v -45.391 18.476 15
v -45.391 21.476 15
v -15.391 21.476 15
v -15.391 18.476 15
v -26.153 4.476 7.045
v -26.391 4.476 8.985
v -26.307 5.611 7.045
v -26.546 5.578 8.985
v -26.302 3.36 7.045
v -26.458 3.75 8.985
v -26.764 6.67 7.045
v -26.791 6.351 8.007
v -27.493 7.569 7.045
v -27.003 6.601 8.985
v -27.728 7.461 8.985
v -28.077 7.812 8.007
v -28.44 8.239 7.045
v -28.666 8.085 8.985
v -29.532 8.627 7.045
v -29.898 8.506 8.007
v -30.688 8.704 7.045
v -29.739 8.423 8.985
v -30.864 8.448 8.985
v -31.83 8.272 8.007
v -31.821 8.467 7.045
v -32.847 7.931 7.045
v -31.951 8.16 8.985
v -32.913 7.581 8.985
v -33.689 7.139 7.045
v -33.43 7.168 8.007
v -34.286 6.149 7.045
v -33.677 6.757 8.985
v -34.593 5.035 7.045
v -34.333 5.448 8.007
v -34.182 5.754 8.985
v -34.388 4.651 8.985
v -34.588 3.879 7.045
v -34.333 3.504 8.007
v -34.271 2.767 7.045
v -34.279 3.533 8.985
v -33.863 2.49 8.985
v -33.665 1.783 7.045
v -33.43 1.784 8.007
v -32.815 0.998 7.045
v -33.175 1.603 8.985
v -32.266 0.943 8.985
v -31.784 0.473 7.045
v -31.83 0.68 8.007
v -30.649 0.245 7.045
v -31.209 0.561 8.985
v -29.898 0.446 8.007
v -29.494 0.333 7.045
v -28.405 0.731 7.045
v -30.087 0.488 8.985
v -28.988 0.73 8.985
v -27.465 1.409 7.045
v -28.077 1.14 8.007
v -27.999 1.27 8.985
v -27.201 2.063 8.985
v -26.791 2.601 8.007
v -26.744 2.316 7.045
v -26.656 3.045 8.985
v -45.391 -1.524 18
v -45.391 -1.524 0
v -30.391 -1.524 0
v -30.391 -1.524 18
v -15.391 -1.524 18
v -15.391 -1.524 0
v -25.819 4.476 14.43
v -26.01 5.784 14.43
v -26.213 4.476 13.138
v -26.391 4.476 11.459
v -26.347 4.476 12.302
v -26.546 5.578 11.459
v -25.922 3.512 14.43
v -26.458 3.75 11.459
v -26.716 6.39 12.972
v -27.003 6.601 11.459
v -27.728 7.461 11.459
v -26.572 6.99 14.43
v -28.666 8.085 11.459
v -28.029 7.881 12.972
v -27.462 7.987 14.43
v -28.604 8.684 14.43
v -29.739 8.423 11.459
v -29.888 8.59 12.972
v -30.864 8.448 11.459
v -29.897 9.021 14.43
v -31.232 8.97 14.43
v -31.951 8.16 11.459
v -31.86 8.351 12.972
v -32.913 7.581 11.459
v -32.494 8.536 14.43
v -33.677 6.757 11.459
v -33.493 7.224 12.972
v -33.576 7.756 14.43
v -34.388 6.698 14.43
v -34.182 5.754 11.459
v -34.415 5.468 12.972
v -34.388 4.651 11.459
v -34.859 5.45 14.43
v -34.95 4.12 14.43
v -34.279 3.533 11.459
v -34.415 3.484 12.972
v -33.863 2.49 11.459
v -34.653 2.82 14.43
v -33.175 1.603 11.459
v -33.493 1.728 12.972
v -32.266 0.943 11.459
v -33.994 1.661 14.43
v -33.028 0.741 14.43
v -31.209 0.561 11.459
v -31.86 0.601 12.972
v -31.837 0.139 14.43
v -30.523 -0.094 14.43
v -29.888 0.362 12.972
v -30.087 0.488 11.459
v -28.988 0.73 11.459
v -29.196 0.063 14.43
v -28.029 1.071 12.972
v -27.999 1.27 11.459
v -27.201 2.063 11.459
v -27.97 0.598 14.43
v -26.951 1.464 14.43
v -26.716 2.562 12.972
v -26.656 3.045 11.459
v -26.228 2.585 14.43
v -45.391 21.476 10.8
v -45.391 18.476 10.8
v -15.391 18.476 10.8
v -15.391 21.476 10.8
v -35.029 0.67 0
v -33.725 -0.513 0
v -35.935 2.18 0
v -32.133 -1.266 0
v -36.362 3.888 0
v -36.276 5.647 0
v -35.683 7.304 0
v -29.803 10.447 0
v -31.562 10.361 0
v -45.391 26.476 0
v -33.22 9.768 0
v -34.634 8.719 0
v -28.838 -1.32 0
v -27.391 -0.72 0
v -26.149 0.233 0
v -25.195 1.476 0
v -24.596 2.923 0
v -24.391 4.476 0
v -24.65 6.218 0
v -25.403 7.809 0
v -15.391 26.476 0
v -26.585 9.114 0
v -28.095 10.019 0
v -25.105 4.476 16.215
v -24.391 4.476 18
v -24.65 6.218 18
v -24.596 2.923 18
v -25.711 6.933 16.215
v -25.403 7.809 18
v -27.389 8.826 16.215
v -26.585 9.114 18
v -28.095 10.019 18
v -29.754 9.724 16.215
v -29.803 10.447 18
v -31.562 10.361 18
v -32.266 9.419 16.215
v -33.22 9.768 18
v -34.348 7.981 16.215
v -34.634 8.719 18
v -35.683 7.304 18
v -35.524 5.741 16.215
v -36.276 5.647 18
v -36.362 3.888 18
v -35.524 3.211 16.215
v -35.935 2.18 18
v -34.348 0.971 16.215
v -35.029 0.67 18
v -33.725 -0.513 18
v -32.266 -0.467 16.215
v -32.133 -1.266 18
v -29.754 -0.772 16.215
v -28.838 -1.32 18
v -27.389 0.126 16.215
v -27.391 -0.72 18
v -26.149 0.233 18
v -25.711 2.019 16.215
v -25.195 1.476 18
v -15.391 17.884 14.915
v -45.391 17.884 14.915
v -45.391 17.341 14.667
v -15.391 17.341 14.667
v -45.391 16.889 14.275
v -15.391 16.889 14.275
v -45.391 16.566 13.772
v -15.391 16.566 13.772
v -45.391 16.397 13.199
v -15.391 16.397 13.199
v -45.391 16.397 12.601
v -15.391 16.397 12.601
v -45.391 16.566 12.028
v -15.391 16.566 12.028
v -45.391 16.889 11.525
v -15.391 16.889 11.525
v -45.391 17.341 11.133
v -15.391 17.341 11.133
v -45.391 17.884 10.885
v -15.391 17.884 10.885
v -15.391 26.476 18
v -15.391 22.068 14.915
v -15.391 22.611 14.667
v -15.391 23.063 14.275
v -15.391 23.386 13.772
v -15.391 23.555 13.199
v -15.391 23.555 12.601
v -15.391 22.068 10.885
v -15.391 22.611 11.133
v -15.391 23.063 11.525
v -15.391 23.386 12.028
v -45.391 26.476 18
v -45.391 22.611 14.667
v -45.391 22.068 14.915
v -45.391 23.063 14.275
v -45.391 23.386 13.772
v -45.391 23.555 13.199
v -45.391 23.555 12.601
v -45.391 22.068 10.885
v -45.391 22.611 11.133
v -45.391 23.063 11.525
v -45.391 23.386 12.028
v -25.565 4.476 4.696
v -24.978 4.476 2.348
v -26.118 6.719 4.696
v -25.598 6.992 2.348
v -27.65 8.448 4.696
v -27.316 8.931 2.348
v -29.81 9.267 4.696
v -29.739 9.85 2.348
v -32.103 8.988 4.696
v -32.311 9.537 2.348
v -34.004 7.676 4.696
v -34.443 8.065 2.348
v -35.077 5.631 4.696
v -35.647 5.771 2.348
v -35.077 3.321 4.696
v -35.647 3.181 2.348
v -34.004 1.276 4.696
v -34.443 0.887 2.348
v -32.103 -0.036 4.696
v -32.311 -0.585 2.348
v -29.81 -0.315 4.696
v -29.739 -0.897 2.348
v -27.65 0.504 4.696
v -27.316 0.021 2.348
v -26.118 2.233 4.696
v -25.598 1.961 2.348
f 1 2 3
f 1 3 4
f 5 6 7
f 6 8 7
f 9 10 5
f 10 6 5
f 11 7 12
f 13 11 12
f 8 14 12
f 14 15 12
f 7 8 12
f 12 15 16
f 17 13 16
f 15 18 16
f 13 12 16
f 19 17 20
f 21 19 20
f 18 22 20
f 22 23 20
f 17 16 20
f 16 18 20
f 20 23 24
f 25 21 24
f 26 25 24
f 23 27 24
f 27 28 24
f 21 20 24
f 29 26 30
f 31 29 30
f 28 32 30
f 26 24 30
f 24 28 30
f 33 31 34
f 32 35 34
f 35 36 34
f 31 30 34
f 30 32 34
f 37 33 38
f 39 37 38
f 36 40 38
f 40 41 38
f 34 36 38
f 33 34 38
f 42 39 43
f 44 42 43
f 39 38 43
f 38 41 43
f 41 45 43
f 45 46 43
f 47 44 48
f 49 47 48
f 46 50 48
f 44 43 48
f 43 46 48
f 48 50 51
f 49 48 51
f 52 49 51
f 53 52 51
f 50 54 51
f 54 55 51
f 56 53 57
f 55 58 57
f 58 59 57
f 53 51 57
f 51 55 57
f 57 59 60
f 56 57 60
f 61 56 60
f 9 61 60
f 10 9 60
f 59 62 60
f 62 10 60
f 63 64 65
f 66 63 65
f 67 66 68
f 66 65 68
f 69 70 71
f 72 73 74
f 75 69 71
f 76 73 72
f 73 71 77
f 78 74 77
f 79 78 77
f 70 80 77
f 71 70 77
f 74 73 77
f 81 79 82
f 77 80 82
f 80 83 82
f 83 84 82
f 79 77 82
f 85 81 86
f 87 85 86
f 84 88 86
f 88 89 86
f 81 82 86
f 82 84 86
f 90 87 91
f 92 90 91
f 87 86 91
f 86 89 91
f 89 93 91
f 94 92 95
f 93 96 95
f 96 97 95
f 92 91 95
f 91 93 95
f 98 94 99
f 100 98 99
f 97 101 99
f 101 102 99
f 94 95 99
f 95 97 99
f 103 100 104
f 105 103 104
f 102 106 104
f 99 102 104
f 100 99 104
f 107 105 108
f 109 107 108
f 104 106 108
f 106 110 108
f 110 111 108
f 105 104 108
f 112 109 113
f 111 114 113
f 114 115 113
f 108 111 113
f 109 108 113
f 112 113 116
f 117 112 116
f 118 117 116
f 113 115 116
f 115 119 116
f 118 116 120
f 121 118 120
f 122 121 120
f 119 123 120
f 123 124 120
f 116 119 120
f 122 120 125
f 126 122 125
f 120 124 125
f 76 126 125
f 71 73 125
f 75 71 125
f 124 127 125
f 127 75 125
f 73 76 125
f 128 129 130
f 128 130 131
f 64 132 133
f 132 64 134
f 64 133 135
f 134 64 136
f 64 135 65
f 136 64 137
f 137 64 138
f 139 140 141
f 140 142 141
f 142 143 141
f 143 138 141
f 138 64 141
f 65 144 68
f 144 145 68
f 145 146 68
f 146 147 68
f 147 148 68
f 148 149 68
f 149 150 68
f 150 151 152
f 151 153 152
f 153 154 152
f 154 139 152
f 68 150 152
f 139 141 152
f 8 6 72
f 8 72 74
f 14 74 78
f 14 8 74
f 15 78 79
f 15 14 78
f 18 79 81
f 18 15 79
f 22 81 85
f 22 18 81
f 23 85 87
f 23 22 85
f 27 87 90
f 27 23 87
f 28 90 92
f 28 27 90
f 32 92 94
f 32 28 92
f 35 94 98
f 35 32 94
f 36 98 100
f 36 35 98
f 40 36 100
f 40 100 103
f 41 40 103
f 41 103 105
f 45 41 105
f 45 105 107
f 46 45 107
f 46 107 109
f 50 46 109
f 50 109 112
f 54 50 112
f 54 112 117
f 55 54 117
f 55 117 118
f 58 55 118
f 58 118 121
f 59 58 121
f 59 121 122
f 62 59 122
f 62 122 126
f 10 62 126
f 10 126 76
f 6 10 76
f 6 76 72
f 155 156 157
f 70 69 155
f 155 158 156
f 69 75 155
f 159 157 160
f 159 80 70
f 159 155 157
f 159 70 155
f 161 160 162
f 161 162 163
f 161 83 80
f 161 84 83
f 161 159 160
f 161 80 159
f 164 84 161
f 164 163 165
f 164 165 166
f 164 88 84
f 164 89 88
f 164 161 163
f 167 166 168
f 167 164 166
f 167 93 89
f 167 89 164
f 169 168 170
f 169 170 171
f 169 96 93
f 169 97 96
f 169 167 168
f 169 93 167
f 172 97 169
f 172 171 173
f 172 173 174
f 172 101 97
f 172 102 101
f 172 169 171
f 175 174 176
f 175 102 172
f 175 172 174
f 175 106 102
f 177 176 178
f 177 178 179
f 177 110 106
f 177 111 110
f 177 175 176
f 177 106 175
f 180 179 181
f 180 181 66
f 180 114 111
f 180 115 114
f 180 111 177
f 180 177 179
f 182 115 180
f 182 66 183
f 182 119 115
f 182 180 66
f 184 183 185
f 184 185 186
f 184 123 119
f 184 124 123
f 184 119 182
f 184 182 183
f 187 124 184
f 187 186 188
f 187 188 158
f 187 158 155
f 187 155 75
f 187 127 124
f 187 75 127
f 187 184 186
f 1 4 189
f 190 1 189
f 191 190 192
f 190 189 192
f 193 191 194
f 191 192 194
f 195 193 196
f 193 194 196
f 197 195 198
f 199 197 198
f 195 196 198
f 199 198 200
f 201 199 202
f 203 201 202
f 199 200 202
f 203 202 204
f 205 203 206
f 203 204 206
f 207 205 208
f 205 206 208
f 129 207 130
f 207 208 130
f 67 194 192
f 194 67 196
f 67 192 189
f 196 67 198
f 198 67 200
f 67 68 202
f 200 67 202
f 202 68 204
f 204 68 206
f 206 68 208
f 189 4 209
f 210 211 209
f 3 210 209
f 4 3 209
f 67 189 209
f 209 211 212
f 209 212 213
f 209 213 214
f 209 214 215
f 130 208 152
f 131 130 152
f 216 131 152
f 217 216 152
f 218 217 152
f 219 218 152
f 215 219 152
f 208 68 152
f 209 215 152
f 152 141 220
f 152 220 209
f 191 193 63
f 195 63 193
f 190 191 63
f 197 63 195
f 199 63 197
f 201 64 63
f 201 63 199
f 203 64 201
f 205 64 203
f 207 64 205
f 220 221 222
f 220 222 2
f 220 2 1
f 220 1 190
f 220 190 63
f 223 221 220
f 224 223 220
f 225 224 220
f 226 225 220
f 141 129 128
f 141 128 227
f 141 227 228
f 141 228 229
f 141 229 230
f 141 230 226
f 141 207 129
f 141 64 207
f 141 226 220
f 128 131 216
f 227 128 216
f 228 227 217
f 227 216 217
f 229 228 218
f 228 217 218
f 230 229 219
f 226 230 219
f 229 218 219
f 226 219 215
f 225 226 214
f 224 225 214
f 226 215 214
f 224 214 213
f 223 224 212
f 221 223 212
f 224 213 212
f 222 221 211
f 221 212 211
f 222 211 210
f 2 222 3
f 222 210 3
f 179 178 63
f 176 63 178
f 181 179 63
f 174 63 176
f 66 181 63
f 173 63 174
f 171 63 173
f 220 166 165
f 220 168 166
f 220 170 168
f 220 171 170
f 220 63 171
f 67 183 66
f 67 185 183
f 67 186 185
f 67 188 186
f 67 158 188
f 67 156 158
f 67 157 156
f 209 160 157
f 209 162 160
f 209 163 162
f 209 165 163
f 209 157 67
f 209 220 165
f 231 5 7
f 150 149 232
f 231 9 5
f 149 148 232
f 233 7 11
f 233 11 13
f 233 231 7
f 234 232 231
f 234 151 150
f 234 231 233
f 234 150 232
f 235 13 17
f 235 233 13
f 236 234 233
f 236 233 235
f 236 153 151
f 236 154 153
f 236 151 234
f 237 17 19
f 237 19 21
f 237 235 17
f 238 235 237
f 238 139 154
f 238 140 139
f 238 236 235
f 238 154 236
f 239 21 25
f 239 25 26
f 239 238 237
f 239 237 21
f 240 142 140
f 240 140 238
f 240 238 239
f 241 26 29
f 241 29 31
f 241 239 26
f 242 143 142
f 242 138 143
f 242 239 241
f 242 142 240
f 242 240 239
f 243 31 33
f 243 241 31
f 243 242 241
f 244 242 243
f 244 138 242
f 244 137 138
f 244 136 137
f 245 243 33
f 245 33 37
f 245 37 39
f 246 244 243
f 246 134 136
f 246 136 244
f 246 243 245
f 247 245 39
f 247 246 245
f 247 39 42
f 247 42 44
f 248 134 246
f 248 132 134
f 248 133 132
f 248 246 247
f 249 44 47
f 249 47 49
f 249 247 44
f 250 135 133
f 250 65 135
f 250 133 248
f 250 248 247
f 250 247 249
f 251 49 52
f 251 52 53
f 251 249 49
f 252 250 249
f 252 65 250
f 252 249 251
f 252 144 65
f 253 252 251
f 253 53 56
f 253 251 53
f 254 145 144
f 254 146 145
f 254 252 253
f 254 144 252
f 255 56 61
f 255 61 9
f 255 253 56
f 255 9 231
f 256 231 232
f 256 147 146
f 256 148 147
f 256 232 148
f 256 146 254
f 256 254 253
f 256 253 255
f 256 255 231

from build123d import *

# Parameters (mm, degrees)
F0_W     = 30
F0_H     = 28
F0_R     = 4
F1_DEPTH = 18
F4_DEPTH = 40
F6_R     = 8
F7_R     = 8


# Not quite as in the source:
# - a fillet or chamfer that OpenCascade refuses, or shapes differently, is made with other operations: its cross-section is extruded or revolved along the edge and cut away or added


with BuildPart() as f1:
    # F0 (on Top) → F1 (new body)
    with BuildSketch(Plane.XY):
        with Locations((-30.3913680837, 12.4760417278)):
            Rectangle(F0_W, F0_H)
        with Locations((-30.3913680837, 4.4760417278)):
            Circle(F0_R, mode=Mode.SUBTRACT)
    extrude(amount=F1_DEPTH)

    # F2: chamfer of 2 x 8 on 1 edges, made by hand

    # F2_s1 → F2_t2 (revolve, cut)
    with BuildSketch(Plane.XZ.offset(-4.4760417278)):
        Polygon((-26.3913680837, 8), (-24.3913680837, 0), (-26.3913680837, 0), align=None)
    revolve(axis=Axis((-30.3913680837, 4.4760417278, 0), (0, 0, 1)), mode=Mode.SUBTRACT)

    # F3 (on face) → F4 (cut)
    with BuildSketch(Plane.YZ.offset(-15.3913680837)):
        with BuildLine():
            Line((18.4760417278, 10.8), (21.4760417278, 10.8))
            ThreePointArc((21.4760417278, 10.8), (23.5760417278, 12.9), (21.4760417278, 15))
            Line((21.4760417278, 15), (18.4760417278, 15))
            ThreePointArc((18.4760417278, 15), (16.3760417278, 12.9), (18.4760417278, 10.8))
        make_face()
    extrude(amount=-F4_DEPTH, mode=Mode.SUBTRACT)

    # F5: chamfer of 5 x 2 on 1 edges, made by hand

    # F5_s1 → F5_t2 (revolve, cut)
    with BuildSketch(Plane.XZ.offset(-4.4760417278)):
        Polygon((-24.3913680837, 18), (-26.3913680837, 13), (-26.3913680837, 18), align=None)
    revolve(axis=Axis((-30.3913680837, 4.4760417278, 18), (0, 0, 1)), mode=Mode.SUBTRACT)

    # F6
    f6_edges = [f1.edges().sort_by_distance(p)[0] for p in [
        (-34.391368, 4.476042, 13),
    ]]
    fillet(f6_edges, radius=F6_R)

    # F7
    f7_edges = [f1.edges().sort_by_distance(p)[0] for p in [
        (-34.391368, 4.476042, 8),
    ]]
    fillet(f7_edges, radius=F7_R)


solid = f1.part
